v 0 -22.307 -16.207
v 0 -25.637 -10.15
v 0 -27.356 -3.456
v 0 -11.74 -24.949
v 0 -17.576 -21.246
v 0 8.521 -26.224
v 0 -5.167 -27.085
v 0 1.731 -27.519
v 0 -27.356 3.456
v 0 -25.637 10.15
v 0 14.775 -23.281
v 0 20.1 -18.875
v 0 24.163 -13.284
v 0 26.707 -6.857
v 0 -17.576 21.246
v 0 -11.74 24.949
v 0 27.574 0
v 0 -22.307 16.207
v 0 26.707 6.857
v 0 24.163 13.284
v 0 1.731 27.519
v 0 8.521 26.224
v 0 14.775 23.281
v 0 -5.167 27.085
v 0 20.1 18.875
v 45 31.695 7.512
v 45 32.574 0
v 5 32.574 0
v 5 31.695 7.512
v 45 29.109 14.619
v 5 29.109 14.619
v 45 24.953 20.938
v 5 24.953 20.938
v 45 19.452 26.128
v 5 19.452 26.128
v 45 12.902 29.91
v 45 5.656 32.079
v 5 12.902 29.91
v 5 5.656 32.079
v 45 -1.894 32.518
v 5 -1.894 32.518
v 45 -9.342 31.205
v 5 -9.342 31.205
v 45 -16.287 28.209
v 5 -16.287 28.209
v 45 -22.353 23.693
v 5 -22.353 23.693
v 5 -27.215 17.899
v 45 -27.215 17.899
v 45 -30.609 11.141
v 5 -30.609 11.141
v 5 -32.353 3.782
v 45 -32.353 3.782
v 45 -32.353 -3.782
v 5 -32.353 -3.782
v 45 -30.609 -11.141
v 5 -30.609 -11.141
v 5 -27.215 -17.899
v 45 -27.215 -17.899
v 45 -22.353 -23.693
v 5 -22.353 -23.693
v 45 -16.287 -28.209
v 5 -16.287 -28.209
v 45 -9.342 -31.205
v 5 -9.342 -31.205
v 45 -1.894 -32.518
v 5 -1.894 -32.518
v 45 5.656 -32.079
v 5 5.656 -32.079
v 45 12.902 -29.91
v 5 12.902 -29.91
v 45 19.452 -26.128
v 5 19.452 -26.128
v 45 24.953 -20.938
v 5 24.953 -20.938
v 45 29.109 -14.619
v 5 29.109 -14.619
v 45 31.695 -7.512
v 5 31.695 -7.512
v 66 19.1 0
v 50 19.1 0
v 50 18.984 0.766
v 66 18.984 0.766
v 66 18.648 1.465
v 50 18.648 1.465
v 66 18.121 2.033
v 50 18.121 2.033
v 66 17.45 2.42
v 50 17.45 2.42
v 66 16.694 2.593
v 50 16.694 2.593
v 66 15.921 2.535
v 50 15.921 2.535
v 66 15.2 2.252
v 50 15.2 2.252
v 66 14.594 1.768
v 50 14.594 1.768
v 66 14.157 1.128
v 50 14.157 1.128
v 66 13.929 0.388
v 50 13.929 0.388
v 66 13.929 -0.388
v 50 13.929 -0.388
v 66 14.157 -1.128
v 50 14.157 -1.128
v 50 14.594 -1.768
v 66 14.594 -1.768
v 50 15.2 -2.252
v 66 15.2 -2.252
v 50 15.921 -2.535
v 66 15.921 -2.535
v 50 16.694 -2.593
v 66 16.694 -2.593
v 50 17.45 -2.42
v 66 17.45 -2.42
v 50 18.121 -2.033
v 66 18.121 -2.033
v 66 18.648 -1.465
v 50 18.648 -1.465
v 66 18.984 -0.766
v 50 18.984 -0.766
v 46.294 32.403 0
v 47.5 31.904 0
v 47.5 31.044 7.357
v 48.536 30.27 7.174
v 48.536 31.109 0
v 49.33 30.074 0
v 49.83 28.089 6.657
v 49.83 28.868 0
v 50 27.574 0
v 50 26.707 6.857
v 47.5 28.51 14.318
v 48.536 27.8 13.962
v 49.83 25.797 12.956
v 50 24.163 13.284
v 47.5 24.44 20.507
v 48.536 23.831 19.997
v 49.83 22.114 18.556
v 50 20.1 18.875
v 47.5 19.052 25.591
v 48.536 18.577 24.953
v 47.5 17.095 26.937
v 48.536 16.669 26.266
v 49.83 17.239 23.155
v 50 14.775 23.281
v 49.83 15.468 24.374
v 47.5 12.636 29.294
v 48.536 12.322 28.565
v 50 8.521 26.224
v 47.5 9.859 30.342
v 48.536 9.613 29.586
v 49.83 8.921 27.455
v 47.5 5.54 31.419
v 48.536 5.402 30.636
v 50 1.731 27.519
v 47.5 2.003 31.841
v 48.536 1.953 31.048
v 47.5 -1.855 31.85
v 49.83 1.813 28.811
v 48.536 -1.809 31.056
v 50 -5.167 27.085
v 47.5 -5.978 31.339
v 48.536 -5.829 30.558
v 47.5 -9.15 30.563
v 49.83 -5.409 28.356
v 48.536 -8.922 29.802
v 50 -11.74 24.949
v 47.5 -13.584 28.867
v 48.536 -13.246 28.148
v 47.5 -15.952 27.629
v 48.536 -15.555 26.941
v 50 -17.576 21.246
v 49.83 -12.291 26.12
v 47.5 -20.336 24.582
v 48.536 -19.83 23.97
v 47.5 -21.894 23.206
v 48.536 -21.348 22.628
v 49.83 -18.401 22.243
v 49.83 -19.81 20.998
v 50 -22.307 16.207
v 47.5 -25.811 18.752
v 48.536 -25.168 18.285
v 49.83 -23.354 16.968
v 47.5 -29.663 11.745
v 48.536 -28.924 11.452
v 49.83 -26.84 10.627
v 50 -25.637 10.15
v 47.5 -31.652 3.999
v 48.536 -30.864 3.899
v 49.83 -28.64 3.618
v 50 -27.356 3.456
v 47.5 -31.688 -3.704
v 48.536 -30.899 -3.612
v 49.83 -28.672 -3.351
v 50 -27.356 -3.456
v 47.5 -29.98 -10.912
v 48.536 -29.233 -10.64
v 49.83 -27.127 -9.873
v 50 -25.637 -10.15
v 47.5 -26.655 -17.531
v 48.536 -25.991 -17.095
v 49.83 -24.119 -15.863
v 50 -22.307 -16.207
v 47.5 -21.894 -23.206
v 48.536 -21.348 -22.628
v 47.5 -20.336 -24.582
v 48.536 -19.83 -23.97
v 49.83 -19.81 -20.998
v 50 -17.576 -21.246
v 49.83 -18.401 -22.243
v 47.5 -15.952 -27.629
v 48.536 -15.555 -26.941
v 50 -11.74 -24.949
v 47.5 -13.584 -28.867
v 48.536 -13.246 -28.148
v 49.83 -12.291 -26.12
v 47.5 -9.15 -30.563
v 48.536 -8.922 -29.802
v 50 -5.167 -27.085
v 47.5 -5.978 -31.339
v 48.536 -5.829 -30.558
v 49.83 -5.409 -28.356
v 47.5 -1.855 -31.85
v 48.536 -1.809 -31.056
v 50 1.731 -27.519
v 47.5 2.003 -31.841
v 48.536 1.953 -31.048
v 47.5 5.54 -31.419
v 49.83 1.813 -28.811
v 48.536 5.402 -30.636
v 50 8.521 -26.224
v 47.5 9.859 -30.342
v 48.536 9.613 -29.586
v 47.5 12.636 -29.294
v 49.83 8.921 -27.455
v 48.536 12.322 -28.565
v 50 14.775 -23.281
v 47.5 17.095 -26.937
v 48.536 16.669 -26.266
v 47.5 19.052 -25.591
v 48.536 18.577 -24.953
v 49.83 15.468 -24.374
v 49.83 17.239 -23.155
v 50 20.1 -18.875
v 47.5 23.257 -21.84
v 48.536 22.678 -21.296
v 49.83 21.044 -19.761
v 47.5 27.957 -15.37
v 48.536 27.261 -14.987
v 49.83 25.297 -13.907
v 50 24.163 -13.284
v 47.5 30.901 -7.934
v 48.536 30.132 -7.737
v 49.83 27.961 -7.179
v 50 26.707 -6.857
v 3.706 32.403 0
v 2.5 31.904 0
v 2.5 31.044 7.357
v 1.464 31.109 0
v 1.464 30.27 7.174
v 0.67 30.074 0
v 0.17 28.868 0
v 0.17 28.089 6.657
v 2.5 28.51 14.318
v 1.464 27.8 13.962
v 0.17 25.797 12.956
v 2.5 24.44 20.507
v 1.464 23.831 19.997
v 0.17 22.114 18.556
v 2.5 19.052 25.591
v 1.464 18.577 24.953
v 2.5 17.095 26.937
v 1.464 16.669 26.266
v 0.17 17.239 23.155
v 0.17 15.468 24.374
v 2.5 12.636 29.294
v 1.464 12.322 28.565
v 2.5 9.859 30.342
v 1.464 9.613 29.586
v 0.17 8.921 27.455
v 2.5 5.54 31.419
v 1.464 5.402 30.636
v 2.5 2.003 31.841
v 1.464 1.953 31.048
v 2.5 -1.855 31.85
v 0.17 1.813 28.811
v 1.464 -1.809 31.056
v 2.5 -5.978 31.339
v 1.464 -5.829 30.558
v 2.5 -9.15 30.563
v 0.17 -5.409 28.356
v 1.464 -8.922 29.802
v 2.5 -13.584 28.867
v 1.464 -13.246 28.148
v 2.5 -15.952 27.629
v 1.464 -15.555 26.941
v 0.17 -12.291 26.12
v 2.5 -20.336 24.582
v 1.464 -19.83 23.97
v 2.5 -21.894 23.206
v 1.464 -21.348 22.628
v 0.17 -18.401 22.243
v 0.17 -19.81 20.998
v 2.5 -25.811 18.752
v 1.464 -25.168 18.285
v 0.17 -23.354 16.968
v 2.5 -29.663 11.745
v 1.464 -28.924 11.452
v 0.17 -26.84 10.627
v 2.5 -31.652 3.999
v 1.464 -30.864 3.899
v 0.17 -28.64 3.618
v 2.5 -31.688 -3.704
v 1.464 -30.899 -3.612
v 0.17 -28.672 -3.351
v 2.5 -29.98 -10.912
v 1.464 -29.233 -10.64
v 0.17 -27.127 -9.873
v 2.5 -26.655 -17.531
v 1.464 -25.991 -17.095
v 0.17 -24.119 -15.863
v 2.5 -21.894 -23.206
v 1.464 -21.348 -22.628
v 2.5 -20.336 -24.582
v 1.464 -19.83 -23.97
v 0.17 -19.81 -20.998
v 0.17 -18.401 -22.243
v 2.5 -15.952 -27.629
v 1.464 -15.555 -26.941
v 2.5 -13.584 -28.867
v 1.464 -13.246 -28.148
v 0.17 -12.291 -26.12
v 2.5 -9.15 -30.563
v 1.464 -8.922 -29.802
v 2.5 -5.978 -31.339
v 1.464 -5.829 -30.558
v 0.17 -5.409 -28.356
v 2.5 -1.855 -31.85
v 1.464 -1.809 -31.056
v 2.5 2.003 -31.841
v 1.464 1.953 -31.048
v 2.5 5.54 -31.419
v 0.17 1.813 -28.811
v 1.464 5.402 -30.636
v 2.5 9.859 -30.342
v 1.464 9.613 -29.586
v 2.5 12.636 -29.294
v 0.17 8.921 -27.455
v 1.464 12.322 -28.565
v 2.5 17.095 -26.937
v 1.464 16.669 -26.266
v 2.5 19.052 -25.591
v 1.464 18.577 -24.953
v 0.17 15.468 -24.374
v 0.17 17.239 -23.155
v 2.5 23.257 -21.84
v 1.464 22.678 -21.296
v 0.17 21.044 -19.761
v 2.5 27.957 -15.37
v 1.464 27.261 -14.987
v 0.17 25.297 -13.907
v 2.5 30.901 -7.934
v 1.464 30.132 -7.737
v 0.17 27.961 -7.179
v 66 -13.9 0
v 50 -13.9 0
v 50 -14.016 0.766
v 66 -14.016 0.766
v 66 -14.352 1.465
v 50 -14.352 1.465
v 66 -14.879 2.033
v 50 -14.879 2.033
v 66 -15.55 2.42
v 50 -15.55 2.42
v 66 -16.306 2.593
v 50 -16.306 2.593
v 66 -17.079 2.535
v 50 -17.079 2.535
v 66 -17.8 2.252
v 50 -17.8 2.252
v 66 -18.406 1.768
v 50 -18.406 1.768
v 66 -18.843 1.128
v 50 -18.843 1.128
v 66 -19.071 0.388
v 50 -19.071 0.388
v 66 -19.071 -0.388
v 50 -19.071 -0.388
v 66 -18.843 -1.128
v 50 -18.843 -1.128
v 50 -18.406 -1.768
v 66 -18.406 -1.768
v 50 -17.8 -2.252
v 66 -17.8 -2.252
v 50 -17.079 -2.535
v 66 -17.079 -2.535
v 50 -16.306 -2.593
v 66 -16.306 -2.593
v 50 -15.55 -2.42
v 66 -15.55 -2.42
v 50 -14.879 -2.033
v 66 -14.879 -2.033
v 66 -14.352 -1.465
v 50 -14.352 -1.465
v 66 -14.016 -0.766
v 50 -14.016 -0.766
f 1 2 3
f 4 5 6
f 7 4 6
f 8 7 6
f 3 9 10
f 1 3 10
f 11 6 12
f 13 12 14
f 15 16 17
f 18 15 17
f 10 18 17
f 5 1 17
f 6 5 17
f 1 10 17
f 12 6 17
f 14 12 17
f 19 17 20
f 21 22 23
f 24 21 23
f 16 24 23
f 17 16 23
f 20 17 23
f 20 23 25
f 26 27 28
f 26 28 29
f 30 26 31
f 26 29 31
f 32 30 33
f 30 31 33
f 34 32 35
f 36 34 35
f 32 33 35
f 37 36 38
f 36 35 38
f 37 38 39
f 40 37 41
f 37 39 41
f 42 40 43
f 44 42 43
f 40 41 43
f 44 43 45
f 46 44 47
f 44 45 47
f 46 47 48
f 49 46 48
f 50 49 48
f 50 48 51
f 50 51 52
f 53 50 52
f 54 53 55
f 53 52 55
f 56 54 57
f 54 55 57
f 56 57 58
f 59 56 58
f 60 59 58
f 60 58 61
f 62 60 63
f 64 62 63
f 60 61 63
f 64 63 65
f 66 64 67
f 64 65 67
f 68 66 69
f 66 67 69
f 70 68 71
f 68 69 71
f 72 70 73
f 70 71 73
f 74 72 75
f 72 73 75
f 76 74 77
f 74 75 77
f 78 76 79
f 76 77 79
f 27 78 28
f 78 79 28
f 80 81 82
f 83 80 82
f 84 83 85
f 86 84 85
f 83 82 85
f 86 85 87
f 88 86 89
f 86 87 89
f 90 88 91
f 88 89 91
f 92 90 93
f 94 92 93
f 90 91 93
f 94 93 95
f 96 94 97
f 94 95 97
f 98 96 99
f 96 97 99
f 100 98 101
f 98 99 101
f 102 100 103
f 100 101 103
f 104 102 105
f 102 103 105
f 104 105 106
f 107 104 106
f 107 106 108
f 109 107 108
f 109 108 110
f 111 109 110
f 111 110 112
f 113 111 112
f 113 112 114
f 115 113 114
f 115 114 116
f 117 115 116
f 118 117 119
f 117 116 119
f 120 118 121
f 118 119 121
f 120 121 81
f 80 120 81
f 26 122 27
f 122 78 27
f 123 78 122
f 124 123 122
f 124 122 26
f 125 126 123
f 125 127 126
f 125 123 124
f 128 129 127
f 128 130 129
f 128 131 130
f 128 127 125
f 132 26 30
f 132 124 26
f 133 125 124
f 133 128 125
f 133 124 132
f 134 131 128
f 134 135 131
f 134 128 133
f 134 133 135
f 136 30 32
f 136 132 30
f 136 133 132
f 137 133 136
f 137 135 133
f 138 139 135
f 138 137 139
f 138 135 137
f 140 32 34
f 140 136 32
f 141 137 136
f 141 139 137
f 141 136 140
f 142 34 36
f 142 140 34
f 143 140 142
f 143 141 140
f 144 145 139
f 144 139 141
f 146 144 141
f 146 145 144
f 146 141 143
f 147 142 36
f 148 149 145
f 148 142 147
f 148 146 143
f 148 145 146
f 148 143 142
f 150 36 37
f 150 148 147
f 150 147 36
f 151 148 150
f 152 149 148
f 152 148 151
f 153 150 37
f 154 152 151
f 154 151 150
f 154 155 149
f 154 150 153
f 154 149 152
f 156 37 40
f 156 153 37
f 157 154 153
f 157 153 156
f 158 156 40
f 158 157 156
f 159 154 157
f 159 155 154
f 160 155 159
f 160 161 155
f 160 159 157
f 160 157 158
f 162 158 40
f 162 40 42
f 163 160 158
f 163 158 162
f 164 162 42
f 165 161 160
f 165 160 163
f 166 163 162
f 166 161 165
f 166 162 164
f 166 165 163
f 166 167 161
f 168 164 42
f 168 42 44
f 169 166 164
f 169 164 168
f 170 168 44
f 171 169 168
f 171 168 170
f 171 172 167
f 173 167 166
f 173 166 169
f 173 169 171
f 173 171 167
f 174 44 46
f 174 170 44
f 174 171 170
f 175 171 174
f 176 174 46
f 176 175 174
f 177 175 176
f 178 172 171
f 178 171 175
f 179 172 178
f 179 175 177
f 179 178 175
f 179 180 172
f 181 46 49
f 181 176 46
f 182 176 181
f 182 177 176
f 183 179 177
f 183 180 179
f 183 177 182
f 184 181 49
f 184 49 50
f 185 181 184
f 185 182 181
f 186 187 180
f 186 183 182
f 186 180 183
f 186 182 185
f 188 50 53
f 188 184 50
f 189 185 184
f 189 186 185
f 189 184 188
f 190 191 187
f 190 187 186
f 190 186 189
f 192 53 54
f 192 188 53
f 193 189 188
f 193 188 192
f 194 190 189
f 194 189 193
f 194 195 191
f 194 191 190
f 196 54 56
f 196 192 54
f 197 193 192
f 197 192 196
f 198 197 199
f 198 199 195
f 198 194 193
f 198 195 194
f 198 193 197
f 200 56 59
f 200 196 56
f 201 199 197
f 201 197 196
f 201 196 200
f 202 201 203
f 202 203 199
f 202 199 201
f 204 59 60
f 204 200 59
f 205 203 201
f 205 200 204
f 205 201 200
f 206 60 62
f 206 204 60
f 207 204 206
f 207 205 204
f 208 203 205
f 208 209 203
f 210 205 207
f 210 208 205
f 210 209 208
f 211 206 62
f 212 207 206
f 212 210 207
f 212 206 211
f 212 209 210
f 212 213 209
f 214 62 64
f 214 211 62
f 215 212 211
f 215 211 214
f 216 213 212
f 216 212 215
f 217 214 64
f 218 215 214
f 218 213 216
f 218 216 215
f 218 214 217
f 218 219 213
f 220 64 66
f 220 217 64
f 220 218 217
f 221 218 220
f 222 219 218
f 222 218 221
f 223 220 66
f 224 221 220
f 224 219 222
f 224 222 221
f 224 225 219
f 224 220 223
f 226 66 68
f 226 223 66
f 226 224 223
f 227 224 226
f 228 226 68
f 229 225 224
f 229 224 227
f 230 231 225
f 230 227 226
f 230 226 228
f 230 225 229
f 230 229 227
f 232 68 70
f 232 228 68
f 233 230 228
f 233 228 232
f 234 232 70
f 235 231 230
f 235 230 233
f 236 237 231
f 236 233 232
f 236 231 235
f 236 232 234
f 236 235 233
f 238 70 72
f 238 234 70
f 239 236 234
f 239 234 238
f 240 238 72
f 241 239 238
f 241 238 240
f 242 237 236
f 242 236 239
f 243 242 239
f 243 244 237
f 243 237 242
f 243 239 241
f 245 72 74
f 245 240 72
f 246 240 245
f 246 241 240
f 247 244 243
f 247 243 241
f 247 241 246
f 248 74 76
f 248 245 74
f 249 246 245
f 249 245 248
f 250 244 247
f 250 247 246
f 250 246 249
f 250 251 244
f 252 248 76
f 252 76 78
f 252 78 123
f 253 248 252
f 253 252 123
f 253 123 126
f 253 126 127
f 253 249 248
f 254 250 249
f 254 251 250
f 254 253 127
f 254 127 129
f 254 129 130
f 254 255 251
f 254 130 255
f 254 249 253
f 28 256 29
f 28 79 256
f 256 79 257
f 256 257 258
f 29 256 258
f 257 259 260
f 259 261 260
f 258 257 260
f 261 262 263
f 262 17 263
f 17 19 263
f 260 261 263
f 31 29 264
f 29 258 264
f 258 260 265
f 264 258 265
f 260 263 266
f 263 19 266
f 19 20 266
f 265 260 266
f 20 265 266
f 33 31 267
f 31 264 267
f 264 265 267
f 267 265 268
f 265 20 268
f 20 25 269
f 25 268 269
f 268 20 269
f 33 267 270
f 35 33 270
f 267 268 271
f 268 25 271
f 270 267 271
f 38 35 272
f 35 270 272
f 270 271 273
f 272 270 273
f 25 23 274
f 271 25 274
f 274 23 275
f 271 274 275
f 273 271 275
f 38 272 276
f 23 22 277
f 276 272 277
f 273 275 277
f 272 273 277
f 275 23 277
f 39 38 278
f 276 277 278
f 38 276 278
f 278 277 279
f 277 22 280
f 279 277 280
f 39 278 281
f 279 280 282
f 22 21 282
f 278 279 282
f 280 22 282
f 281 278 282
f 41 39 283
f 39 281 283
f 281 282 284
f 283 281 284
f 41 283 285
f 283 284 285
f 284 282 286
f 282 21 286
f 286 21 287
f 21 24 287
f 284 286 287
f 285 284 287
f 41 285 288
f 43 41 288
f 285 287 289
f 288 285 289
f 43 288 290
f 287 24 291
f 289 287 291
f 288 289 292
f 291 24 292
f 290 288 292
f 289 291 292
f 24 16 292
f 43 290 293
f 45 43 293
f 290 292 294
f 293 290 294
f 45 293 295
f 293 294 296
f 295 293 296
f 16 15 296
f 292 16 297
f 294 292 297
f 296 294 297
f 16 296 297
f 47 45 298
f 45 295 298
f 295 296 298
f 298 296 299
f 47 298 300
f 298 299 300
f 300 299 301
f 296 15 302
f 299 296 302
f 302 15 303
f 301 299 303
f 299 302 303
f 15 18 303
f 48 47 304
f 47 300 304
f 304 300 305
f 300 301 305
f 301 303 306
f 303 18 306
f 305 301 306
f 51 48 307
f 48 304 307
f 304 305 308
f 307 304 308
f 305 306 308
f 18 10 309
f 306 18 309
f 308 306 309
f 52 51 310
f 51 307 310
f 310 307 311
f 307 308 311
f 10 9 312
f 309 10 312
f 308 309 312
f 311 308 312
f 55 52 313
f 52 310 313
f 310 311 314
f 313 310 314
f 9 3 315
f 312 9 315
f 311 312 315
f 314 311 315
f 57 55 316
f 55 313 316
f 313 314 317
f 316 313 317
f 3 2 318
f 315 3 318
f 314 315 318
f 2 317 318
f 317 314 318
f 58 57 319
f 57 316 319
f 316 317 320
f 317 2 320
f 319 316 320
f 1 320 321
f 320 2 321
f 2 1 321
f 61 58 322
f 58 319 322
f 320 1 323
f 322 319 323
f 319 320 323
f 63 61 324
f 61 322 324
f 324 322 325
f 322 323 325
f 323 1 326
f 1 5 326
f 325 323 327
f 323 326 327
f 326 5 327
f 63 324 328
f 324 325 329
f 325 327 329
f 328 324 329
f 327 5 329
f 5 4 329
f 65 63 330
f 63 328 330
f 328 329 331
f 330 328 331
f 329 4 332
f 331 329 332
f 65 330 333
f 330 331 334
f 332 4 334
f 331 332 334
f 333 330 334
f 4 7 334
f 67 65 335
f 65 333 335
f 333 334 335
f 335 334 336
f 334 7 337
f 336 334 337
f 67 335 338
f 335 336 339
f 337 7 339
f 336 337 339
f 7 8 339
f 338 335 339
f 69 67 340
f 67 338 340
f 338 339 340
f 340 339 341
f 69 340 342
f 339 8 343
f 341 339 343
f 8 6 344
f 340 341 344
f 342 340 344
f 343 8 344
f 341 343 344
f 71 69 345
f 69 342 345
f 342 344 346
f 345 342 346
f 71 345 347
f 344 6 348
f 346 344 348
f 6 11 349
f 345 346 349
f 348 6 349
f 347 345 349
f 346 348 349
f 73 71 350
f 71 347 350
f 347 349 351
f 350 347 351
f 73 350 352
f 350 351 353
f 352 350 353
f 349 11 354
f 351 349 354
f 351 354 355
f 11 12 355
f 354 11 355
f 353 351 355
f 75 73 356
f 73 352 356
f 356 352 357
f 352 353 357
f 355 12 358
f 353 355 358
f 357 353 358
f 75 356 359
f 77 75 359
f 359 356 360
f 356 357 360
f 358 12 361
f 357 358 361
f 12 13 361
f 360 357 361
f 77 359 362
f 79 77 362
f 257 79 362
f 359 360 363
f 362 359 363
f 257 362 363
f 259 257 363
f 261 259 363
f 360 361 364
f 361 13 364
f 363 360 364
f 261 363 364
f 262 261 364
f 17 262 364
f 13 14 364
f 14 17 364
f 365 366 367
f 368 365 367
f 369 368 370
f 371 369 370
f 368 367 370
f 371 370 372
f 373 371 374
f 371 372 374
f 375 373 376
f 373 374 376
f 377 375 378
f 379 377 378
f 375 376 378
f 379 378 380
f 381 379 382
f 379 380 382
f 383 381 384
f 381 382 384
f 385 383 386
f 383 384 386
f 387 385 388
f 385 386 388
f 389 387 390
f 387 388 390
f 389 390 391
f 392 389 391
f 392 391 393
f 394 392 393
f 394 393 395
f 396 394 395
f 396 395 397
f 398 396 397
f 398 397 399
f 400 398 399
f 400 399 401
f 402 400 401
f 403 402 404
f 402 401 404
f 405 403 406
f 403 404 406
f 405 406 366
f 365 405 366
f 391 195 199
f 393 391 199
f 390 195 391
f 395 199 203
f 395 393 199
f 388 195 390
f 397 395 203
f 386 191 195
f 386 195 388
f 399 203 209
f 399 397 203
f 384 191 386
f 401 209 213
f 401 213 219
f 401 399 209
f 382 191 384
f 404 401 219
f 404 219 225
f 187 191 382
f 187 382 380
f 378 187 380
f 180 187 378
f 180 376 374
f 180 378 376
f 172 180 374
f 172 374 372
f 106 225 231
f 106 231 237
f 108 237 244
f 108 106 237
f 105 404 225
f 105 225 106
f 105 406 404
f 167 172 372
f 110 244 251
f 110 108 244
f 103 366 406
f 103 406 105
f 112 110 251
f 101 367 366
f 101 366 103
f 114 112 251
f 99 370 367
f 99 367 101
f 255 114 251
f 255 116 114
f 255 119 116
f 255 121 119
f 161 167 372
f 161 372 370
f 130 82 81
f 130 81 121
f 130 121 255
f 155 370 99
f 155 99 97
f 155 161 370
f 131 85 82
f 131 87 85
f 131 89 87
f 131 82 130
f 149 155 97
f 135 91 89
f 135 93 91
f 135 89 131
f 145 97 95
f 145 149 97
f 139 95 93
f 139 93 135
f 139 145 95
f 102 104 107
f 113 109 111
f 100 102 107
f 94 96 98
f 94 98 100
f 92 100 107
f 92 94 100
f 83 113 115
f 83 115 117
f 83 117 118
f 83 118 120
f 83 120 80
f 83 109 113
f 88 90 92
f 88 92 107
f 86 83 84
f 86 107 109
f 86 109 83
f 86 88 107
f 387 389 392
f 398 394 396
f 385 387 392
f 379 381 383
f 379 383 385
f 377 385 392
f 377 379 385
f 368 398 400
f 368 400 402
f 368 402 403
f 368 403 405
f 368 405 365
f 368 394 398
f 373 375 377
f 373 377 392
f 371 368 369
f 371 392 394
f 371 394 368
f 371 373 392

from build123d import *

# Parameters (mm, degrees)
F0_R     = 32.5735
F1_DEPTH = 50
F2_R     = 5
F3_R     = 2.6
F4_DEPTH = 16


with BuildPart() as f1:
    # F0 (on Right) → F1 (new body)
    with BuildSketch(Plane.YZ):
        Circle(F0_R)
    extrude(amount=F1_DEPTH)

    # F2
    f2_edges = [f1.edges().sort_by_distance(p)[0] for p in [
        (50, -32.5735, 0),
        (0, -32.5735, 0),
    ]]
    fillet(f2_edges, radius=F2_R)

    # F3 (on face) → F4 (join)
    with BuildSketch(Plane.YZ.offset(50)):
        with Locations((16.5, 0)):
            Circle(F3_R)
        with Locations((-16.5, 0)):
            Circle(F3_R)
    extrude(amount=F4_DEPTH)


solid = f1.part
